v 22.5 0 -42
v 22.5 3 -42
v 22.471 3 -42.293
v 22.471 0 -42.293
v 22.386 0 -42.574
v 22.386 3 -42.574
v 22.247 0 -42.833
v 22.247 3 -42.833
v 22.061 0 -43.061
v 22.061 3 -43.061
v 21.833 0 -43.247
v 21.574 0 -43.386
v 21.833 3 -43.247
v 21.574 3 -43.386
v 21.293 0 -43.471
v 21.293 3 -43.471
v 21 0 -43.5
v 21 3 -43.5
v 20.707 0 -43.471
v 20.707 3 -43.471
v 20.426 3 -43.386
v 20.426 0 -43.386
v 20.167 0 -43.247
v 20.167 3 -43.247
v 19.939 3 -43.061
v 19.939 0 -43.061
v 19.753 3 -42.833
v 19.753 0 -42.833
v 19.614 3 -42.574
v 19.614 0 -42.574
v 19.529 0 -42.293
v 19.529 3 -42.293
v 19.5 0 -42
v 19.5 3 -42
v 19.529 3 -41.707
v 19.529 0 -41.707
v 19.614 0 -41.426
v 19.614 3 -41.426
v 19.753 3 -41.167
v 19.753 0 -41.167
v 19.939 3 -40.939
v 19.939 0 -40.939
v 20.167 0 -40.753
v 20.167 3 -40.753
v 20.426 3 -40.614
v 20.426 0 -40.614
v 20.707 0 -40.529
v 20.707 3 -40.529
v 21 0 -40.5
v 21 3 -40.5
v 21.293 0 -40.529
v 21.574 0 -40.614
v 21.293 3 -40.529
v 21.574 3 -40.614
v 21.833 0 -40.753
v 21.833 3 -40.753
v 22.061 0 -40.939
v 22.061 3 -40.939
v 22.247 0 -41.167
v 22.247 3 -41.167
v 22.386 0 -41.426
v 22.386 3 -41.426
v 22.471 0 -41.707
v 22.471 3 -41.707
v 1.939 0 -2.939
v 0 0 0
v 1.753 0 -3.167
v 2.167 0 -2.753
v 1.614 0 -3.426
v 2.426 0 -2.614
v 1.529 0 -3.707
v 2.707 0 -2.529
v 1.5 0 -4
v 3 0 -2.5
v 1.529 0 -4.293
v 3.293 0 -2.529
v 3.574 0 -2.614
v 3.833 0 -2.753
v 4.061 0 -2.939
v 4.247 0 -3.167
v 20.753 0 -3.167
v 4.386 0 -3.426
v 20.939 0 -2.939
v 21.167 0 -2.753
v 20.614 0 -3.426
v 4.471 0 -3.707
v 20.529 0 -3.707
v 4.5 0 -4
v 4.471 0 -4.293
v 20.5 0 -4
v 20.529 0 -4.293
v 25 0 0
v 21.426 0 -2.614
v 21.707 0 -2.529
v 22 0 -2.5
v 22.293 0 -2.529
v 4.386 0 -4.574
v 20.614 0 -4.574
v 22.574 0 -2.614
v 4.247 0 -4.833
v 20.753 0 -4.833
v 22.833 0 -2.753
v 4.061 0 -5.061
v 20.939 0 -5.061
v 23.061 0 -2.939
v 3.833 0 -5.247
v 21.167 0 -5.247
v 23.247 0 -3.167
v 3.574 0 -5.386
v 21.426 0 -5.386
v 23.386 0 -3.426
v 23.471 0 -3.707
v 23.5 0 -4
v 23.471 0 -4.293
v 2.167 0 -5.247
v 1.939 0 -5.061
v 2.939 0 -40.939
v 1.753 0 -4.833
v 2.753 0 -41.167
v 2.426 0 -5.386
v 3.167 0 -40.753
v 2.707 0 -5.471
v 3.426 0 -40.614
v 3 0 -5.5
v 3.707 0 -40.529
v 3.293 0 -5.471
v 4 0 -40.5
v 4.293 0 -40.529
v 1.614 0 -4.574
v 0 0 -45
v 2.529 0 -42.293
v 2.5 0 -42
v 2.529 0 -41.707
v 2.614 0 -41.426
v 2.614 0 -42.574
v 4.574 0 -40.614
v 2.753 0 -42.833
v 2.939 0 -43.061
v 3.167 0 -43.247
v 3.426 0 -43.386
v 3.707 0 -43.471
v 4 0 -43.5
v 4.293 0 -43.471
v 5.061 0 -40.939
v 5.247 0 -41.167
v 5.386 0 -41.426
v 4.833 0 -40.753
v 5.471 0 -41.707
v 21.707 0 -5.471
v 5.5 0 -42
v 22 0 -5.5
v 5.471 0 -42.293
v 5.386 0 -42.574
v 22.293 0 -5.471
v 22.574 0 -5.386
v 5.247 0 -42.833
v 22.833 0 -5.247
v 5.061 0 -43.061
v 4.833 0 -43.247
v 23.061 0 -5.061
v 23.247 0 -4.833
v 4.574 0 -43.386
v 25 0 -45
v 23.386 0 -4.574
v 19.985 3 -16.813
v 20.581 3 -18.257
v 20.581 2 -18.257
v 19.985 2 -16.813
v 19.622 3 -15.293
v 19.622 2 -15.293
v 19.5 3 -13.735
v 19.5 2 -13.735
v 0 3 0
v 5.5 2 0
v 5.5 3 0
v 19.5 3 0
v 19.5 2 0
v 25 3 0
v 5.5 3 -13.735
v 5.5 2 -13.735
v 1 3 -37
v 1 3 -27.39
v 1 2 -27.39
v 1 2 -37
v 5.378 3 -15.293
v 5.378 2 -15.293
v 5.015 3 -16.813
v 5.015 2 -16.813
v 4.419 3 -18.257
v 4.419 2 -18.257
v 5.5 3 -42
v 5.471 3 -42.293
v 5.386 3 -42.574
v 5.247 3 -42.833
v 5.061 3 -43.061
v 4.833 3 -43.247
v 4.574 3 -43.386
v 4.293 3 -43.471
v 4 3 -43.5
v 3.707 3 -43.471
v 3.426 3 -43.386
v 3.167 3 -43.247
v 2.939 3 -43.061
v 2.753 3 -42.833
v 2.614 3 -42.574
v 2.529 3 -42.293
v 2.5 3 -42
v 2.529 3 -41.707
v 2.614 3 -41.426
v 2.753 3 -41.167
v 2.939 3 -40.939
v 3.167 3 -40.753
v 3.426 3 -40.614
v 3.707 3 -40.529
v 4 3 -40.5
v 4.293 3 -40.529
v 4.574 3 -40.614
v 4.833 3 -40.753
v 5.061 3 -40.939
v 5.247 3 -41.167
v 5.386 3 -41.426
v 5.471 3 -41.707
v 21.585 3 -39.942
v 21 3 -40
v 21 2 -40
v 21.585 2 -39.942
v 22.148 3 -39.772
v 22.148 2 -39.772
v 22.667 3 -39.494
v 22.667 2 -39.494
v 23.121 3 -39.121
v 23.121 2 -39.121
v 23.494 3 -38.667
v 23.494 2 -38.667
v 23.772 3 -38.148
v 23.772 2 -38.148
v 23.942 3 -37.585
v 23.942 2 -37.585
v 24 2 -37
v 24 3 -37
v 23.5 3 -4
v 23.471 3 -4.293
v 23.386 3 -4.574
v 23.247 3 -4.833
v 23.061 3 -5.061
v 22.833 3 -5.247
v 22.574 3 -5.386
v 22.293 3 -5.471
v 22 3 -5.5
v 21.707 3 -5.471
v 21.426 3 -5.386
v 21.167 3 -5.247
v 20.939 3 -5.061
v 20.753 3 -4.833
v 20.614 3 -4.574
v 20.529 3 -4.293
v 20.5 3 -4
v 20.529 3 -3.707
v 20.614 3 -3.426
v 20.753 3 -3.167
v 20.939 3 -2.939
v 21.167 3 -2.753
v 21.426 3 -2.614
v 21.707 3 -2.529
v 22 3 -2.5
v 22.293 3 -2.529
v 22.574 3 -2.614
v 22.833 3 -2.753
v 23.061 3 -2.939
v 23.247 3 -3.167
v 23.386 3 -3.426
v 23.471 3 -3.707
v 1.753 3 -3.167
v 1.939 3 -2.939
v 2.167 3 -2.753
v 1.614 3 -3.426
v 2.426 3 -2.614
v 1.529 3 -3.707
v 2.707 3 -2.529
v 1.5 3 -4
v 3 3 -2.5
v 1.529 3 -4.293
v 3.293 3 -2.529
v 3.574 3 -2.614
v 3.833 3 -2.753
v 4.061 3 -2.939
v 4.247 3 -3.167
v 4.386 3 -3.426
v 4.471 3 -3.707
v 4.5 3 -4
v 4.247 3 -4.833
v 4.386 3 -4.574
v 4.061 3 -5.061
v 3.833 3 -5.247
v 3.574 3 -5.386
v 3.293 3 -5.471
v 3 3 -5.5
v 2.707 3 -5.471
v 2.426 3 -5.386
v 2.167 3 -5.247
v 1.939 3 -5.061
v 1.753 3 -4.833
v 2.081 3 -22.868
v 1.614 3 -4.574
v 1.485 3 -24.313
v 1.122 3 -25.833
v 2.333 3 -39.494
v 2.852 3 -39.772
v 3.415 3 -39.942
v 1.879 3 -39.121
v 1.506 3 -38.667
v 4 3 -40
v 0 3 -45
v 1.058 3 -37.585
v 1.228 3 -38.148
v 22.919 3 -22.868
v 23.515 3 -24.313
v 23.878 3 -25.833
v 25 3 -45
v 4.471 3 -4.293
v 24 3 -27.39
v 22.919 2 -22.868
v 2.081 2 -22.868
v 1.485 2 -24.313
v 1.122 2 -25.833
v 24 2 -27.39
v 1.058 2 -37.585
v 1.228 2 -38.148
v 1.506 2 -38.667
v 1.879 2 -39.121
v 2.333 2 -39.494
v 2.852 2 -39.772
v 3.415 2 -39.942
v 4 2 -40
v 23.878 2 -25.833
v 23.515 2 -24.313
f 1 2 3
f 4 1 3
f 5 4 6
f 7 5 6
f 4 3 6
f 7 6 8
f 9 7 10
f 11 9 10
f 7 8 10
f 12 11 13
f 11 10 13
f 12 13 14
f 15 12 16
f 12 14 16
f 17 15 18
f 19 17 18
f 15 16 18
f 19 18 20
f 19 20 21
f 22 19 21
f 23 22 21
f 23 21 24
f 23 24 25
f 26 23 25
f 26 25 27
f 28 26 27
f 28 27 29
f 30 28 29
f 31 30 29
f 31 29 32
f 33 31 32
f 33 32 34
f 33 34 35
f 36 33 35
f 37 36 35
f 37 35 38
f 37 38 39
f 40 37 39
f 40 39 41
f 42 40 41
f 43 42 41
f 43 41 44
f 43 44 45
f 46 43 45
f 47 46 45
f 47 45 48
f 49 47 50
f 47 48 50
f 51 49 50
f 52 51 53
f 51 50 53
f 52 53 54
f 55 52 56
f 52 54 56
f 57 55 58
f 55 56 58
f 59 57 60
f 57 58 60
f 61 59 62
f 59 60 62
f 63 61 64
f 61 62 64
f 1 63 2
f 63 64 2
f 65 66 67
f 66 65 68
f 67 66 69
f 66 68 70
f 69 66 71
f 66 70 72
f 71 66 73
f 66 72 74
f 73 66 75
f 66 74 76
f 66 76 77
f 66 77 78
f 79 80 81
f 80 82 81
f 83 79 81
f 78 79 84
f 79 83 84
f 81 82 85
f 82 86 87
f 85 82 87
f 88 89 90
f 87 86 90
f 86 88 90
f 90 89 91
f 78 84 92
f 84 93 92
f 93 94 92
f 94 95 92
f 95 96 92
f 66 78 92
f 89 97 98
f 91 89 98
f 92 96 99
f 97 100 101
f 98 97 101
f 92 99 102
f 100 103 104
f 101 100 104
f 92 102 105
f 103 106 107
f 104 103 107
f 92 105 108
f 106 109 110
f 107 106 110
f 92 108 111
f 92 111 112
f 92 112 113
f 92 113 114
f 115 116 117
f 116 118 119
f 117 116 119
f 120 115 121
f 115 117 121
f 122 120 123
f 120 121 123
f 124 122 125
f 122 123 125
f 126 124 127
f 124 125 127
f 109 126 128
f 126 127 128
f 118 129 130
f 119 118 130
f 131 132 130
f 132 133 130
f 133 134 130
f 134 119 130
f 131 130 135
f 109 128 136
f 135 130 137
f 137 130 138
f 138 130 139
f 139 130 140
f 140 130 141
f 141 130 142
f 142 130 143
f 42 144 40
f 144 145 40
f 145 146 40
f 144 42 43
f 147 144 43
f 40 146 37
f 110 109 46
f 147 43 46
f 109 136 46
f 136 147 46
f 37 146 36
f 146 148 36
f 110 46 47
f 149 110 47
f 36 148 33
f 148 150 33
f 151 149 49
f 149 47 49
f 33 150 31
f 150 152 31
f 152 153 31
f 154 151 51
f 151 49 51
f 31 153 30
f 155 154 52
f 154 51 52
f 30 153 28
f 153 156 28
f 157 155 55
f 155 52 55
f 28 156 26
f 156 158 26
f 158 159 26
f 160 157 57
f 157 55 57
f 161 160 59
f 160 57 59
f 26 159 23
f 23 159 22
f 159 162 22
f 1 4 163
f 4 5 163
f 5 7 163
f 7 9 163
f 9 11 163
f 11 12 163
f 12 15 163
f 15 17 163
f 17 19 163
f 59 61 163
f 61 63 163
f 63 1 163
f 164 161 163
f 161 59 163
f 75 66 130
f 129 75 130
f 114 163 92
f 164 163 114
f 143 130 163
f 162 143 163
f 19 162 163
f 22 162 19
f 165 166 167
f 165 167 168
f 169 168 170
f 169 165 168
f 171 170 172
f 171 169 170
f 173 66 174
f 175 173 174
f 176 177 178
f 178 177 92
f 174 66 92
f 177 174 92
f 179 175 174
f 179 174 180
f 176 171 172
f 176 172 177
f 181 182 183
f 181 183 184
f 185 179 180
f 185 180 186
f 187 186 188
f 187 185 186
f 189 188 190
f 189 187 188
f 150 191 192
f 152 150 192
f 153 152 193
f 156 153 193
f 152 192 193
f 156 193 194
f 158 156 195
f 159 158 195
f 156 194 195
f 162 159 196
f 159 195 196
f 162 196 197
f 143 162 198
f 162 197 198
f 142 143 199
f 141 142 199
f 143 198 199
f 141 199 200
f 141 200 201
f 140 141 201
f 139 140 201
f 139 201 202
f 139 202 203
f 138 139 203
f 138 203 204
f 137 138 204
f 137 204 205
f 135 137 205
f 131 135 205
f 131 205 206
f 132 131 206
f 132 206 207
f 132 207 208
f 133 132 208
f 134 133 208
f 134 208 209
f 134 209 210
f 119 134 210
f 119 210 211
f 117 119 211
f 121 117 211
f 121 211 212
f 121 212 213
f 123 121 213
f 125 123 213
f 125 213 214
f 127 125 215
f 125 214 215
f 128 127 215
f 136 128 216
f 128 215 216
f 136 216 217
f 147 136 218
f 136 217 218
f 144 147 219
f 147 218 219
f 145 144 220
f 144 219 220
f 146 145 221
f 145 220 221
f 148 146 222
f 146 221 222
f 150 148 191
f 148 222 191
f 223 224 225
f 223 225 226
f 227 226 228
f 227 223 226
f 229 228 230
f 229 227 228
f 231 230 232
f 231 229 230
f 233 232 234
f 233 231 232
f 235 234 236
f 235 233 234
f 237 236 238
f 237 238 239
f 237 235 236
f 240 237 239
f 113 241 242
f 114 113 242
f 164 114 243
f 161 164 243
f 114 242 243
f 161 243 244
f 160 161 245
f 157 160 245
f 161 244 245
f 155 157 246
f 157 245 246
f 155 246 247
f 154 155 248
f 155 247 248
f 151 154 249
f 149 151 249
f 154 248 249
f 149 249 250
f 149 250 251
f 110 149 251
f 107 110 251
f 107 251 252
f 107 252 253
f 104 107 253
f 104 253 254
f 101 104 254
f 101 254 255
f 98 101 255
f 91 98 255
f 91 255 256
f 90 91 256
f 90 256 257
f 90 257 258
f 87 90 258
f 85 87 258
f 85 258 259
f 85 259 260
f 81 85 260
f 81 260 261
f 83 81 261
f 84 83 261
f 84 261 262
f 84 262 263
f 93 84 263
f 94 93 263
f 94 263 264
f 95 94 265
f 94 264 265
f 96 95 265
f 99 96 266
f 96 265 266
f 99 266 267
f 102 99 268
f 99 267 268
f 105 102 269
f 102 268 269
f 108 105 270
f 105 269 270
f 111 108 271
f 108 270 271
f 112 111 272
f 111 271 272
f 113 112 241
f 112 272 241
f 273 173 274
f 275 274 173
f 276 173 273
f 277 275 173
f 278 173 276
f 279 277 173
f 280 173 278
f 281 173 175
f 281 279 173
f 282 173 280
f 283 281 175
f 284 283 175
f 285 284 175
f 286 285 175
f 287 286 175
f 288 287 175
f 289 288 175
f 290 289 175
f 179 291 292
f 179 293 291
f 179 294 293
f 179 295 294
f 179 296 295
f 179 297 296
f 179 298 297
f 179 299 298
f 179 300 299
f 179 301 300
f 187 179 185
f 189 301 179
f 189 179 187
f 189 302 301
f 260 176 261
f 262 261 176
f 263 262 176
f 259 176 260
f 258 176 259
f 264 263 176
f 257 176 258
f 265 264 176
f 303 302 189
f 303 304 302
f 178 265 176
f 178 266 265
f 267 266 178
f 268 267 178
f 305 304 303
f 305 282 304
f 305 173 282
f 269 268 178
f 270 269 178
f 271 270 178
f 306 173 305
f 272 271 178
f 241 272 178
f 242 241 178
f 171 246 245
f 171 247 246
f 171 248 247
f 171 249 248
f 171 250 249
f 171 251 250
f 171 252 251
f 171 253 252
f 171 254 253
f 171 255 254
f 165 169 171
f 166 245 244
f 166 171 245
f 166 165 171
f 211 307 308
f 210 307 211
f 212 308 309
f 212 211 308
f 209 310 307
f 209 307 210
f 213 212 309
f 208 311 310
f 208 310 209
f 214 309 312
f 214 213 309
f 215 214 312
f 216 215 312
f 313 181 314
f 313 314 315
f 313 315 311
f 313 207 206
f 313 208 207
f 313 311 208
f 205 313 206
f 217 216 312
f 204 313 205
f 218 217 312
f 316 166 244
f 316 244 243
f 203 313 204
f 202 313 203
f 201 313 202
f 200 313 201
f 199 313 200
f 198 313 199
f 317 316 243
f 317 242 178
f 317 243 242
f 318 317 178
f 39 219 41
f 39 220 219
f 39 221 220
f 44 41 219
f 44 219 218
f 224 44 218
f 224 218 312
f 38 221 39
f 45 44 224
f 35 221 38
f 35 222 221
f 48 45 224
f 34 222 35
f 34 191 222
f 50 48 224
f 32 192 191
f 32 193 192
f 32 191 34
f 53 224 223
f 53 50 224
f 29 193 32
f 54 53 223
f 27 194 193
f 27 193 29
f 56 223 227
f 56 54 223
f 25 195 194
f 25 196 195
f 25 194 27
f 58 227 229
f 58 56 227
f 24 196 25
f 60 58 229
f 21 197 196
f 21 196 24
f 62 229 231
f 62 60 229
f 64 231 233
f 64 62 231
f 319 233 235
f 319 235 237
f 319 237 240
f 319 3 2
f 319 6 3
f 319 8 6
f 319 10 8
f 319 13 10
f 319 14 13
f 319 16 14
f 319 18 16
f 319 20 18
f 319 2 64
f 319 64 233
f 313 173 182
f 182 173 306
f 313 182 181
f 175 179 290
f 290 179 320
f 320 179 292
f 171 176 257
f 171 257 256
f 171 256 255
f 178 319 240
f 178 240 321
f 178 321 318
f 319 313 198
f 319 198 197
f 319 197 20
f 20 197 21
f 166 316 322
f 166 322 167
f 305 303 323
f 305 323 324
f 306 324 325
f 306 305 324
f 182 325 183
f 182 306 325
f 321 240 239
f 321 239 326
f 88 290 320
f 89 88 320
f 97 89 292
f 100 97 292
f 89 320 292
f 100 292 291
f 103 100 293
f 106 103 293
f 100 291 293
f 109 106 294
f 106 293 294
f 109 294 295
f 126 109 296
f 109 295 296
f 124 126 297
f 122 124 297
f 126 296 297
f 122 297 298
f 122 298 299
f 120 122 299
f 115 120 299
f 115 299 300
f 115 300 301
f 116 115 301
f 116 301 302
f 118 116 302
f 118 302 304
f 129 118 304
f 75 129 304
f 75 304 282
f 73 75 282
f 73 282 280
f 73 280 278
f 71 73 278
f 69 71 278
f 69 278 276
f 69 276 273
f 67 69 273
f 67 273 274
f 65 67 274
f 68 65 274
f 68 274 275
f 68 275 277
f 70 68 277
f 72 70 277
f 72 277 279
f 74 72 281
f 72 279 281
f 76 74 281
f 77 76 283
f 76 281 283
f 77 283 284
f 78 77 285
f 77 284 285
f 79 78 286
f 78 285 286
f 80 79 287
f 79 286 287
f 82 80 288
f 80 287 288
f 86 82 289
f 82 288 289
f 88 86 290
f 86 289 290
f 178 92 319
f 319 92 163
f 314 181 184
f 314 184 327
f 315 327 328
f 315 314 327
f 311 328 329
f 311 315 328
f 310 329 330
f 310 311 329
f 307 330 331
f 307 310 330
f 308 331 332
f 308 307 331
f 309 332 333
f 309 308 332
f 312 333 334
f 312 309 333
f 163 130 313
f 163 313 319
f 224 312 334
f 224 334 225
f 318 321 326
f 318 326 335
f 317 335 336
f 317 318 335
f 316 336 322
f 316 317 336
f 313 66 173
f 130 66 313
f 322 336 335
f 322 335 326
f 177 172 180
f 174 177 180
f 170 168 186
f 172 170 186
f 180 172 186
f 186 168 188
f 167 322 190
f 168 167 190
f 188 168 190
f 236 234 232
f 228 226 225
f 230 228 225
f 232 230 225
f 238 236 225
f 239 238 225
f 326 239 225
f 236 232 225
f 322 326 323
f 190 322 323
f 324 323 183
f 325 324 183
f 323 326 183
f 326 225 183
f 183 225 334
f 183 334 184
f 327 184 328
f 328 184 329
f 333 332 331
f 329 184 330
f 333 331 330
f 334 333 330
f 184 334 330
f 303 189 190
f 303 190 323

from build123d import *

# Parameters (mm, degrees)
SKETCH1_W           = 25
SKETCH1_H           = 45
BOSS_EXTRUDE1_DEPTH = 3
CUT_EXTRUDE1_DEPTH  = 1
SKETCH3_R           = 1.5
CUT_EXTRUDE2_DEPTH  = 4


with BuildPart() as part:
    # Sketch1 → Boss-Extrude1 (new body)
    with BuildSketch(Plane(origin=(0, 0, 0), x_dir=(1, 0, 0), z_dir=(0, 1, 0))):
        with Locations((12.5, 22.5)):
            Rectangle(SKETCH1_W, SKETCH1_H)
    extrude(amount=BOSS_EXTRUDE1_DEPTH)

    # Sketch2 → Cut-Extrude1 (cut)
    with BuildSketch(Plane(origin=(0, 3, 0), x_dir=(1, 0, 0), z_dir=(0, 1, 0))):
        with BuildLine():
            Line((4, 40), (21, 40))
            ThreePointArc((21, 40), (23.121320344, 39.121320344), (24, 37))
            Line((24, 37), (24, 27.390411508))
            ThreePointArc((24, 27.390411508), (23.725985305, 25.065500788), (22.918958029, 22.868002009))
            Line((22.918958029, 22.868002009), (20.581041971, 18.257235294))
            ThreePointArc((20.581041971, 18.257235294), (19.774014695, 16.059736514), (19.5, 13.734825794))
            Line((19.5, 13.734825794), (19.5, 0))
            Line((19.5, 0), (5.5, 0))
            Line((5.5, 0), (5.5, 13.734825794))
            ThreePointArc((5.5, 13.734825794), (5.225985305, 16.059736514), (4.418958029, 18.257235294))
            Line((4.418958029, 18.257235294), (2.081041971, 22.868002009))
            ThreePointArc((2.081041971, 22.868002009), (1.274014695, 25.065500788), (1, 27.390411508))
            Line((1, 27.390411508), (1, 37))
            ThreePointArc((1, 37), (1.878679656, 39.121320344), (4, 40))
        make_face()
    extrude(amount=-CUT_EXTRUDE1_DEPTH, mode=Mode.SUBTRACT)

    # Sketch3 → Cut-Extrude2 (cut, through all)
    with BuildSketch(Plane(origin=(0, 3, 0), x_dir=(1, 0, 0), z_dir=(0, 1, 0))):
        with Locations((21, 42)):
            Circle(SKETCH3_R)
        with Locations((4, 42)):
            Circle(SKETCH3_R)
        with Locations((3, 4)):
            Circle(SKETCH3_R)
        with Locations((22, 4)):
            Circle(SKETCH3_R)
    extrude(amount=-CUT_EXTRUDE2_DEPTH, mode=Mode.SUBTRACT)


solid = part.part
